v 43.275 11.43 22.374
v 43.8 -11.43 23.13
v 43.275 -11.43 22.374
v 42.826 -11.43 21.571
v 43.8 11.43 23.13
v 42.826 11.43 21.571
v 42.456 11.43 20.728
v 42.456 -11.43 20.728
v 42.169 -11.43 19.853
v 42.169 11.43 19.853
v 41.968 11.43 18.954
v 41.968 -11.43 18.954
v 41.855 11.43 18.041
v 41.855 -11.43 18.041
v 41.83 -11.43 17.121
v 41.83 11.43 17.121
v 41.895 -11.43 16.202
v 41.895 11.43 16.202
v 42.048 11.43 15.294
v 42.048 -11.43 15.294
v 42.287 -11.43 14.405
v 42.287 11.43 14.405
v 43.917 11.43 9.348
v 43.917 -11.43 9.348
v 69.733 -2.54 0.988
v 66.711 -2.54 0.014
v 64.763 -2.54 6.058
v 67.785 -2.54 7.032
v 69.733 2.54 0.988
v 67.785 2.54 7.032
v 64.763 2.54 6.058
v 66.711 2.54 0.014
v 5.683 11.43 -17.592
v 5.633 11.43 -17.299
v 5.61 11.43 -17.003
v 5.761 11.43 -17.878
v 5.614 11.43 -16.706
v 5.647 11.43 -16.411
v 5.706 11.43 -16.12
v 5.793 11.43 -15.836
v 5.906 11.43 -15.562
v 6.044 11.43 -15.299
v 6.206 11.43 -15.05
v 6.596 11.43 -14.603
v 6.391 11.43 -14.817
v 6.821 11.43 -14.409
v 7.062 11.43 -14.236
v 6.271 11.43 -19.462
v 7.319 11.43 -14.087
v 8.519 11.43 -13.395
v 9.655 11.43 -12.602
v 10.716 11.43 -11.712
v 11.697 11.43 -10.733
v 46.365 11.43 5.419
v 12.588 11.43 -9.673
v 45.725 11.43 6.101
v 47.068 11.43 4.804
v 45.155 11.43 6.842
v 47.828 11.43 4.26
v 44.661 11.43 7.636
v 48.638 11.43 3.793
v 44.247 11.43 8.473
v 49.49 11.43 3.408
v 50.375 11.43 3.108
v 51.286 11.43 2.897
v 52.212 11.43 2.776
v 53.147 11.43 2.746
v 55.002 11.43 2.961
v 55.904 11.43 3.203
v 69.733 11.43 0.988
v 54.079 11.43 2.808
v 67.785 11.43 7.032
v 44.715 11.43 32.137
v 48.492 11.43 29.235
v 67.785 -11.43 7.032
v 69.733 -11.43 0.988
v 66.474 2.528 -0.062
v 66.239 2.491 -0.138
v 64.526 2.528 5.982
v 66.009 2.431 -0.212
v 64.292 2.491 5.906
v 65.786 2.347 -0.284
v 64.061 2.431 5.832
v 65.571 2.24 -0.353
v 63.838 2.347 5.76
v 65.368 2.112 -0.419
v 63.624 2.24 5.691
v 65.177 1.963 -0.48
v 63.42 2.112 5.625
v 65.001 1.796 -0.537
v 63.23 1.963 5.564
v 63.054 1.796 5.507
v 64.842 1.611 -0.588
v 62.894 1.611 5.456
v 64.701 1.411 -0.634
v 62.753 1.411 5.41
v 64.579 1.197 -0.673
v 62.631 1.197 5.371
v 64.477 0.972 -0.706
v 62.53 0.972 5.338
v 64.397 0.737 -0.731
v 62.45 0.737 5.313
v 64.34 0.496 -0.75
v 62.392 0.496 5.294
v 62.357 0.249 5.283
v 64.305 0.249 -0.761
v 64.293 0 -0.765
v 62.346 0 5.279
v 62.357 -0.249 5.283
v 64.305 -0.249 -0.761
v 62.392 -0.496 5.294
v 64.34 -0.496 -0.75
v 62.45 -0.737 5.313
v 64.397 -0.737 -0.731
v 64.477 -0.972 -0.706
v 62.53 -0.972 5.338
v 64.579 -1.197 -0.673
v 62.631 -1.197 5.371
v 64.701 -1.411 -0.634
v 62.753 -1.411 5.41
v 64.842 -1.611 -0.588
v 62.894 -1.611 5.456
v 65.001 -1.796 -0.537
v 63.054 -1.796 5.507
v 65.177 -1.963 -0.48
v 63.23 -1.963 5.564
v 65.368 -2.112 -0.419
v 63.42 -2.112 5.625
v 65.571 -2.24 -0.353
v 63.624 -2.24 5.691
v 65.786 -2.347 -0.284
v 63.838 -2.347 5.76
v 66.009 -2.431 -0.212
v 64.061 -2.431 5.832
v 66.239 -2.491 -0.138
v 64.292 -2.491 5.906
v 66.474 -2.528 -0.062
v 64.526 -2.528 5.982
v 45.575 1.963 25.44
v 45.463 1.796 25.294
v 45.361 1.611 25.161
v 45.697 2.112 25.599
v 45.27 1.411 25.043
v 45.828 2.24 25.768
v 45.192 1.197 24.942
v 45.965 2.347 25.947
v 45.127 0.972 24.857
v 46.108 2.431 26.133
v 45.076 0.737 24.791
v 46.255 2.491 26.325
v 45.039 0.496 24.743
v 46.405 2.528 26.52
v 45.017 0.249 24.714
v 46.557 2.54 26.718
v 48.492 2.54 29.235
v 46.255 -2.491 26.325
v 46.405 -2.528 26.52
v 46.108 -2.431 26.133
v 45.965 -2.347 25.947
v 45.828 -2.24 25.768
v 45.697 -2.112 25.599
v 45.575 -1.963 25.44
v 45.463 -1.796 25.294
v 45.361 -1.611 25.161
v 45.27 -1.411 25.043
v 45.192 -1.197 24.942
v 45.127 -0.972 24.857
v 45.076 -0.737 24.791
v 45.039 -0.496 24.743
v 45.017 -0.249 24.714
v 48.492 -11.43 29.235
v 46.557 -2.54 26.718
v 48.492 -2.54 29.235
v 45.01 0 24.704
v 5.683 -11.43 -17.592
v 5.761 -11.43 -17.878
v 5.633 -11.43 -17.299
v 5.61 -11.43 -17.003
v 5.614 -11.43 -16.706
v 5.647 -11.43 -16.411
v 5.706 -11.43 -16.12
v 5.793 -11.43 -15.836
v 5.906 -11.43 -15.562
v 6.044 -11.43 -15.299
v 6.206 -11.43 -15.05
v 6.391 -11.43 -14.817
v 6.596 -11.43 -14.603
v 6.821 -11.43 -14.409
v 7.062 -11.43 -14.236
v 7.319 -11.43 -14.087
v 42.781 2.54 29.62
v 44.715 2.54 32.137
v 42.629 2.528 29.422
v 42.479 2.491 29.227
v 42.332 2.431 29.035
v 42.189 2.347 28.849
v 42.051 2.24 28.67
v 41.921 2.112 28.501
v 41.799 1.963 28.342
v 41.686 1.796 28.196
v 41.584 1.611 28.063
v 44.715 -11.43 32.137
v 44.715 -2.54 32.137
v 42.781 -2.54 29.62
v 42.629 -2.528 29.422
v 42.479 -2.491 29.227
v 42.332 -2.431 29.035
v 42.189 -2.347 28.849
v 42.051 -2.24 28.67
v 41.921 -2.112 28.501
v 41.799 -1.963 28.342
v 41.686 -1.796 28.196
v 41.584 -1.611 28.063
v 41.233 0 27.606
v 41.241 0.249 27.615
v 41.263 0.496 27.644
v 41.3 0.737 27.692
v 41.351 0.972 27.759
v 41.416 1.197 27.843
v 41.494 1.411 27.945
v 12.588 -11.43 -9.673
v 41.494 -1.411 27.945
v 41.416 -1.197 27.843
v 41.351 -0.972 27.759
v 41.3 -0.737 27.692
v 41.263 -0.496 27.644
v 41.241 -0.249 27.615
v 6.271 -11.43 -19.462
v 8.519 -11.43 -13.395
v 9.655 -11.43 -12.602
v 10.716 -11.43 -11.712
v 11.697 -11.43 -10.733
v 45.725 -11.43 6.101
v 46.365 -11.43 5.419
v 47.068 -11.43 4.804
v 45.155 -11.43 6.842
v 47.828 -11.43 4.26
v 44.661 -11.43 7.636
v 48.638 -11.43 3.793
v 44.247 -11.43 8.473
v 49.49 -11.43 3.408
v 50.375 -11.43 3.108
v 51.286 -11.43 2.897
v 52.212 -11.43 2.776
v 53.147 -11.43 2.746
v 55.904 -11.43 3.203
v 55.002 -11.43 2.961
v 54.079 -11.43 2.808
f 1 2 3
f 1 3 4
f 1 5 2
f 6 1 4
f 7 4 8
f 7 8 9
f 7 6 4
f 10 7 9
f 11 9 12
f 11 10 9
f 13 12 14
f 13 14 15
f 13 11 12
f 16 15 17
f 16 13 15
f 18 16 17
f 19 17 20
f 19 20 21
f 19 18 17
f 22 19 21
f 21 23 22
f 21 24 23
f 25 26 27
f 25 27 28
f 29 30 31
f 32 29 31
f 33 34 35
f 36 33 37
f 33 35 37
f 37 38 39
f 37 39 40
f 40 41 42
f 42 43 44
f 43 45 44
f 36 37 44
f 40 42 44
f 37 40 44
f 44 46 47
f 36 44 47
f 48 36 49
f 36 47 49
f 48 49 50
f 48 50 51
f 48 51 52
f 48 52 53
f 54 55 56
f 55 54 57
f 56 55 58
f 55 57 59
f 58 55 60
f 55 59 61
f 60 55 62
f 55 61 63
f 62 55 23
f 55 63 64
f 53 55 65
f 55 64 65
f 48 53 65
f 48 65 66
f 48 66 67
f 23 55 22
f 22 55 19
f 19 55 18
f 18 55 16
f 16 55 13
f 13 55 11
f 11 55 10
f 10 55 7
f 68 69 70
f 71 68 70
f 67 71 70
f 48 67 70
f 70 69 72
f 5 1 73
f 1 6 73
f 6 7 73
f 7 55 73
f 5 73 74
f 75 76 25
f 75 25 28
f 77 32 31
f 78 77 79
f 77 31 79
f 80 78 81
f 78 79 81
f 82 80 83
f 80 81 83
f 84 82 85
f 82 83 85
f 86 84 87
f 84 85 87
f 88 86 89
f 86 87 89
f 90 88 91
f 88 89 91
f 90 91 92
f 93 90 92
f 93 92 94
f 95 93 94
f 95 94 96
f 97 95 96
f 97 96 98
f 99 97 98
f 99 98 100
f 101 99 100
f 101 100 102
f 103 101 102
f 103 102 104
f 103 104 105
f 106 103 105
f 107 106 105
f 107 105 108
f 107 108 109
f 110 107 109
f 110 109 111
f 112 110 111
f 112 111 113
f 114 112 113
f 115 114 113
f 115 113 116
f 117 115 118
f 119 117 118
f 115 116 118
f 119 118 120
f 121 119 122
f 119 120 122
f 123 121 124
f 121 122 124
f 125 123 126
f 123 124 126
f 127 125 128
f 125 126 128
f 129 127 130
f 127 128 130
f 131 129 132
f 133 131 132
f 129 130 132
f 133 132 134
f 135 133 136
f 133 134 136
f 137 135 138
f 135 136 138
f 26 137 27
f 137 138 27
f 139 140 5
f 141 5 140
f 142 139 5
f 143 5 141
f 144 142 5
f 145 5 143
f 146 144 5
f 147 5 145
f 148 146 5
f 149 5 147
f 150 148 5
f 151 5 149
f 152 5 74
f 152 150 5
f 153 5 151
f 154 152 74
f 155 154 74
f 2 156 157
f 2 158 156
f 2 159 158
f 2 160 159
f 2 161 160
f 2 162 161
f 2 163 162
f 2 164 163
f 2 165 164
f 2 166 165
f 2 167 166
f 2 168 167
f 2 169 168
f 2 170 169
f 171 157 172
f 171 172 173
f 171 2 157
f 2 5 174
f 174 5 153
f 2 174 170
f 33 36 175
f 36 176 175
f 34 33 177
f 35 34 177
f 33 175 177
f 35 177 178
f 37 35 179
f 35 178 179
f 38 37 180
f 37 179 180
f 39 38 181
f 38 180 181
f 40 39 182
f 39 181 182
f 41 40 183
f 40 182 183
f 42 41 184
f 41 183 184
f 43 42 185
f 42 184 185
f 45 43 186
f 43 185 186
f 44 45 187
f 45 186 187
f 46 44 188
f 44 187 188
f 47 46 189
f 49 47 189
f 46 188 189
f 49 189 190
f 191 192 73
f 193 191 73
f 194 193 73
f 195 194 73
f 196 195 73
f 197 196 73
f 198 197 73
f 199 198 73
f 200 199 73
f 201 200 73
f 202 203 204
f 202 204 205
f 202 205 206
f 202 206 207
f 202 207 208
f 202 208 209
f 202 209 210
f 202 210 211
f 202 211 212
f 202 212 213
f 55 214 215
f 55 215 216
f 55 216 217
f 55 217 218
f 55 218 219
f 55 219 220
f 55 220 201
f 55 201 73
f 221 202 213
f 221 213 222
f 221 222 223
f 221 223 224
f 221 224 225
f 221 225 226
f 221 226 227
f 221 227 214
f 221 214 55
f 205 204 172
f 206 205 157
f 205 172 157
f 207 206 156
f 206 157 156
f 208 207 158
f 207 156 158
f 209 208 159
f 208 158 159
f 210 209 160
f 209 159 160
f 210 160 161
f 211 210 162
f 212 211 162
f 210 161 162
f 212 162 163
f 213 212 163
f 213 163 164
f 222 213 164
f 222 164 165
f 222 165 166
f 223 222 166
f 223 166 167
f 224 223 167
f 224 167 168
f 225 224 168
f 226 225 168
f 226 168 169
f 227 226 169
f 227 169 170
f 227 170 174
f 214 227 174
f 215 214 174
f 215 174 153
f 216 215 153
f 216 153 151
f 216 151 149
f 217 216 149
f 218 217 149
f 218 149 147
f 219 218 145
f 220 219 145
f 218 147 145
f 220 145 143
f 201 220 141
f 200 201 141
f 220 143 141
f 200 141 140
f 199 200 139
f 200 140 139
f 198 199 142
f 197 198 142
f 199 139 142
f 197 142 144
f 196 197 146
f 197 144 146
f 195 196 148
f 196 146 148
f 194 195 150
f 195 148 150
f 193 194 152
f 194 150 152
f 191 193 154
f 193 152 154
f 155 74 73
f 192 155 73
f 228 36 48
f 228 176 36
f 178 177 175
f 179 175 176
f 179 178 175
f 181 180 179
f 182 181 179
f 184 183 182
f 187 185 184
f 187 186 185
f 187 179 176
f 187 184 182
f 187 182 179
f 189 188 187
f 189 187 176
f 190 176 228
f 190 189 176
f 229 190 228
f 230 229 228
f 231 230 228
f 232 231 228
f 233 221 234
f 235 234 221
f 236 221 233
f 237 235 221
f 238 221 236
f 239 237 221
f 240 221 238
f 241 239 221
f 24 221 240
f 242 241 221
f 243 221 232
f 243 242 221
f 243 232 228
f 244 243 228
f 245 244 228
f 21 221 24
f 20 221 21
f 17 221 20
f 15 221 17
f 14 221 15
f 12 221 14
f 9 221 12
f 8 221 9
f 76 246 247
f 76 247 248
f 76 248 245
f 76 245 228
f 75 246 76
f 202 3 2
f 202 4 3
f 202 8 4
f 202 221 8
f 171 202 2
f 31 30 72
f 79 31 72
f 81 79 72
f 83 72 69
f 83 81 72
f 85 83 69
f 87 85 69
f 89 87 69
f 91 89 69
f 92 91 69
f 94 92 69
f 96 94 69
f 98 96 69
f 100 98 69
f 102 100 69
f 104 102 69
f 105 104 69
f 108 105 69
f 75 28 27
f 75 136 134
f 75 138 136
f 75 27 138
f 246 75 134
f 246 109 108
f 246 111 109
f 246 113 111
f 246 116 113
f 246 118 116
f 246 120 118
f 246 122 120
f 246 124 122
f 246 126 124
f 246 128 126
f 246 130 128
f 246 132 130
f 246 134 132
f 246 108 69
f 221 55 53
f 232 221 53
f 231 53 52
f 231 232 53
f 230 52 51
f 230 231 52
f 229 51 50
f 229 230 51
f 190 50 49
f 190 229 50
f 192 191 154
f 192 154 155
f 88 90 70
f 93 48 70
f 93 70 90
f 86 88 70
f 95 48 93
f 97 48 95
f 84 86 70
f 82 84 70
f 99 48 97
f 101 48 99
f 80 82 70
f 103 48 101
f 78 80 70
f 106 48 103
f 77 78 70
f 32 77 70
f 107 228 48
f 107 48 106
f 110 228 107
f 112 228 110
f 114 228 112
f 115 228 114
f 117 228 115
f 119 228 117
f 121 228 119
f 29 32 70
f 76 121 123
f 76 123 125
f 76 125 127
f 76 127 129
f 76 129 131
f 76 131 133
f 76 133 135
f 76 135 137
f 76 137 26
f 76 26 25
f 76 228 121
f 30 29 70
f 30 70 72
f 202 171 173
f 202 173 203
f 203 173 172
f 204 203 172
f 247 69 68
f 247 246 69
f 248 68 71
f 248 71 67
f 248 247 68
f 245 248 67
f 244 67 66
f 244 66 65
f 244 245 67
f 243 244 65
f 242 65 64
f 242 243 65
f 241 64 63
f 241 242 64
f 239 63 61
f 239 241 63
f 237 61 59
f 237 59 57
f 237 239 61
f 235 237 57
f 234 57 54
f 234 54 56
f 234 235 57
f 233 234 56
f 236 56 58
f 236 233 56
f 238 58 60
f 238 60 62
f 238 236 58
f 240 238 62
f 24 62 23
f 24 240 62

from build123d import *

# Parameters (mm, degrees)
F1_DEPTH      = 11.43
F1_DEPTH_BACK = 11.43
F4_DEPTH      = 25.4
F5_DEPTH      = 25.4
F6_R          = 9.525
F7_R          = 3.175


with BuildPart() as f1:
    # F0 (on Front) → F1 (new body, two sides)
    with BuildSketch(Plane.XZ) as f1_sk:
        with BuildLine():
            Line((44.7153352637, 32.1372644044), (12.5878580118, -9.6727170782))
            ThreePointArc((12.5878580118, -9.6727170782), (9.1419703563, -12.9784437821), (4.868931841, -15.1099016452))
            Line((4.868931841, -15.1099016452), (6.2711842112, -19.461553319))
            Line((6.2711842112, -19.461553319), (69.7327711211, 0.987960413))
            Line((69.7327711211, 0.987960413), (67.7851983847, 7.0319210711))
            Line((67.7851983847, 7.0319210711), (46.8382920625, 0.2821048541))
            Line((46.8382920625, 0.2821048541), (40.7535190047, 19.1651628715))
            Line((40.7535190047, 19.1651628715), (48.4916926673, 29.235449281))
            Line((48.4916926673, 29.235449281), (44.7153352637, 32.1372644044))
        make_face()
    extrude(amount=F1_DEPTH)
    extrude(f1_sk.sketch, amount=-F1_DEPTH_BACK)

    # F3 (on face) → F4 (cut)
    with BuildSketch(Plane(origin=(16.3642154154, 0, -12.5745322016), x_dir=(0, 1, 0), z_dir=(0.7929359378, 0, -0.6093050128))):
        with BuildLine():
            ThreePointArc((-2.54, 49.5530698125), (0, 47.0130698125), (2.54, 49.5530698125))
            ThreePointArc((2.54, 49.5530698125), (0, 52.0930698125), (-2.54, 49.5530698125))
        make_face()
        with BuildLine():
            ThreePointArc((-2.54, 49.5530698125), (0, 52.0930698125), (2.54, 49.5530698125))
            Line((2.54, 49.5530698125), (2.54, 52.7280698125))
            Line((2.54, 52.7280698125), (-2.54, 52.7280698125))
            Line((-2.54, 52.7280698125), (-2.54, 49.5530698125))
        make_face()
    extrude(amount=-F4_DEPTH, mode=Mode.SUBTRACT)

    # F2 (on face) → F5 (cut)
    with BuildSketch(Plane(origin=(4.3236114748, 0, -13.4175926609), x_dir=(0.951804828, 0, 0.3067043679), z_dir=(-0.3067043679, 0, 0.951804828))):
        with BuildLine():
            ThreePointArc((63.5, -2.54), (65.2960512242, -1.7960512242), (66.04, 0))
            ThreePointArc((66.04, 0), (65.2960512242, 1.7960512242), (63.5, 2.54))
            ThreePointArc((63.5, 2.54), (60.96, 0), (63.5, -2.54))
        make_face()
        with BuildLine():
            ThreePointArc((63.5, 2.54), (65.2960512242, 1.7960512242), (66.04, 0))
            ThreePointArc((66.04, 0), (65.2960512242, -1.7960512242), (63.5, -2.54))
            Line((63.5, -2.54), (66.675, -2.54))
            Line((66.675, -2.54), (66.675, 2.54))
            Line((66.675, 2.54), (63.5, 2.54))
        make_face()
    extrude(amount=-F5_DEPTH, mode=Mode.SUBTRACT)

    # F6
    f6_edges = [f1.edges().sort_by_distance(p)[0] for p in [
        (46.838292, 0, 0.282105),
        (40.753519, 0, 19.165163),
    ]]
    fillet(f6_edges, radius=F6_R)

    # F7
    f7_edges = [f1.edges().sort_by_distance(p)[0] for p in [
        (4.868932, 0, -15.109902),
    ]]
    fillet(f7_edges, radius=F7_R)


solid = f1.part
